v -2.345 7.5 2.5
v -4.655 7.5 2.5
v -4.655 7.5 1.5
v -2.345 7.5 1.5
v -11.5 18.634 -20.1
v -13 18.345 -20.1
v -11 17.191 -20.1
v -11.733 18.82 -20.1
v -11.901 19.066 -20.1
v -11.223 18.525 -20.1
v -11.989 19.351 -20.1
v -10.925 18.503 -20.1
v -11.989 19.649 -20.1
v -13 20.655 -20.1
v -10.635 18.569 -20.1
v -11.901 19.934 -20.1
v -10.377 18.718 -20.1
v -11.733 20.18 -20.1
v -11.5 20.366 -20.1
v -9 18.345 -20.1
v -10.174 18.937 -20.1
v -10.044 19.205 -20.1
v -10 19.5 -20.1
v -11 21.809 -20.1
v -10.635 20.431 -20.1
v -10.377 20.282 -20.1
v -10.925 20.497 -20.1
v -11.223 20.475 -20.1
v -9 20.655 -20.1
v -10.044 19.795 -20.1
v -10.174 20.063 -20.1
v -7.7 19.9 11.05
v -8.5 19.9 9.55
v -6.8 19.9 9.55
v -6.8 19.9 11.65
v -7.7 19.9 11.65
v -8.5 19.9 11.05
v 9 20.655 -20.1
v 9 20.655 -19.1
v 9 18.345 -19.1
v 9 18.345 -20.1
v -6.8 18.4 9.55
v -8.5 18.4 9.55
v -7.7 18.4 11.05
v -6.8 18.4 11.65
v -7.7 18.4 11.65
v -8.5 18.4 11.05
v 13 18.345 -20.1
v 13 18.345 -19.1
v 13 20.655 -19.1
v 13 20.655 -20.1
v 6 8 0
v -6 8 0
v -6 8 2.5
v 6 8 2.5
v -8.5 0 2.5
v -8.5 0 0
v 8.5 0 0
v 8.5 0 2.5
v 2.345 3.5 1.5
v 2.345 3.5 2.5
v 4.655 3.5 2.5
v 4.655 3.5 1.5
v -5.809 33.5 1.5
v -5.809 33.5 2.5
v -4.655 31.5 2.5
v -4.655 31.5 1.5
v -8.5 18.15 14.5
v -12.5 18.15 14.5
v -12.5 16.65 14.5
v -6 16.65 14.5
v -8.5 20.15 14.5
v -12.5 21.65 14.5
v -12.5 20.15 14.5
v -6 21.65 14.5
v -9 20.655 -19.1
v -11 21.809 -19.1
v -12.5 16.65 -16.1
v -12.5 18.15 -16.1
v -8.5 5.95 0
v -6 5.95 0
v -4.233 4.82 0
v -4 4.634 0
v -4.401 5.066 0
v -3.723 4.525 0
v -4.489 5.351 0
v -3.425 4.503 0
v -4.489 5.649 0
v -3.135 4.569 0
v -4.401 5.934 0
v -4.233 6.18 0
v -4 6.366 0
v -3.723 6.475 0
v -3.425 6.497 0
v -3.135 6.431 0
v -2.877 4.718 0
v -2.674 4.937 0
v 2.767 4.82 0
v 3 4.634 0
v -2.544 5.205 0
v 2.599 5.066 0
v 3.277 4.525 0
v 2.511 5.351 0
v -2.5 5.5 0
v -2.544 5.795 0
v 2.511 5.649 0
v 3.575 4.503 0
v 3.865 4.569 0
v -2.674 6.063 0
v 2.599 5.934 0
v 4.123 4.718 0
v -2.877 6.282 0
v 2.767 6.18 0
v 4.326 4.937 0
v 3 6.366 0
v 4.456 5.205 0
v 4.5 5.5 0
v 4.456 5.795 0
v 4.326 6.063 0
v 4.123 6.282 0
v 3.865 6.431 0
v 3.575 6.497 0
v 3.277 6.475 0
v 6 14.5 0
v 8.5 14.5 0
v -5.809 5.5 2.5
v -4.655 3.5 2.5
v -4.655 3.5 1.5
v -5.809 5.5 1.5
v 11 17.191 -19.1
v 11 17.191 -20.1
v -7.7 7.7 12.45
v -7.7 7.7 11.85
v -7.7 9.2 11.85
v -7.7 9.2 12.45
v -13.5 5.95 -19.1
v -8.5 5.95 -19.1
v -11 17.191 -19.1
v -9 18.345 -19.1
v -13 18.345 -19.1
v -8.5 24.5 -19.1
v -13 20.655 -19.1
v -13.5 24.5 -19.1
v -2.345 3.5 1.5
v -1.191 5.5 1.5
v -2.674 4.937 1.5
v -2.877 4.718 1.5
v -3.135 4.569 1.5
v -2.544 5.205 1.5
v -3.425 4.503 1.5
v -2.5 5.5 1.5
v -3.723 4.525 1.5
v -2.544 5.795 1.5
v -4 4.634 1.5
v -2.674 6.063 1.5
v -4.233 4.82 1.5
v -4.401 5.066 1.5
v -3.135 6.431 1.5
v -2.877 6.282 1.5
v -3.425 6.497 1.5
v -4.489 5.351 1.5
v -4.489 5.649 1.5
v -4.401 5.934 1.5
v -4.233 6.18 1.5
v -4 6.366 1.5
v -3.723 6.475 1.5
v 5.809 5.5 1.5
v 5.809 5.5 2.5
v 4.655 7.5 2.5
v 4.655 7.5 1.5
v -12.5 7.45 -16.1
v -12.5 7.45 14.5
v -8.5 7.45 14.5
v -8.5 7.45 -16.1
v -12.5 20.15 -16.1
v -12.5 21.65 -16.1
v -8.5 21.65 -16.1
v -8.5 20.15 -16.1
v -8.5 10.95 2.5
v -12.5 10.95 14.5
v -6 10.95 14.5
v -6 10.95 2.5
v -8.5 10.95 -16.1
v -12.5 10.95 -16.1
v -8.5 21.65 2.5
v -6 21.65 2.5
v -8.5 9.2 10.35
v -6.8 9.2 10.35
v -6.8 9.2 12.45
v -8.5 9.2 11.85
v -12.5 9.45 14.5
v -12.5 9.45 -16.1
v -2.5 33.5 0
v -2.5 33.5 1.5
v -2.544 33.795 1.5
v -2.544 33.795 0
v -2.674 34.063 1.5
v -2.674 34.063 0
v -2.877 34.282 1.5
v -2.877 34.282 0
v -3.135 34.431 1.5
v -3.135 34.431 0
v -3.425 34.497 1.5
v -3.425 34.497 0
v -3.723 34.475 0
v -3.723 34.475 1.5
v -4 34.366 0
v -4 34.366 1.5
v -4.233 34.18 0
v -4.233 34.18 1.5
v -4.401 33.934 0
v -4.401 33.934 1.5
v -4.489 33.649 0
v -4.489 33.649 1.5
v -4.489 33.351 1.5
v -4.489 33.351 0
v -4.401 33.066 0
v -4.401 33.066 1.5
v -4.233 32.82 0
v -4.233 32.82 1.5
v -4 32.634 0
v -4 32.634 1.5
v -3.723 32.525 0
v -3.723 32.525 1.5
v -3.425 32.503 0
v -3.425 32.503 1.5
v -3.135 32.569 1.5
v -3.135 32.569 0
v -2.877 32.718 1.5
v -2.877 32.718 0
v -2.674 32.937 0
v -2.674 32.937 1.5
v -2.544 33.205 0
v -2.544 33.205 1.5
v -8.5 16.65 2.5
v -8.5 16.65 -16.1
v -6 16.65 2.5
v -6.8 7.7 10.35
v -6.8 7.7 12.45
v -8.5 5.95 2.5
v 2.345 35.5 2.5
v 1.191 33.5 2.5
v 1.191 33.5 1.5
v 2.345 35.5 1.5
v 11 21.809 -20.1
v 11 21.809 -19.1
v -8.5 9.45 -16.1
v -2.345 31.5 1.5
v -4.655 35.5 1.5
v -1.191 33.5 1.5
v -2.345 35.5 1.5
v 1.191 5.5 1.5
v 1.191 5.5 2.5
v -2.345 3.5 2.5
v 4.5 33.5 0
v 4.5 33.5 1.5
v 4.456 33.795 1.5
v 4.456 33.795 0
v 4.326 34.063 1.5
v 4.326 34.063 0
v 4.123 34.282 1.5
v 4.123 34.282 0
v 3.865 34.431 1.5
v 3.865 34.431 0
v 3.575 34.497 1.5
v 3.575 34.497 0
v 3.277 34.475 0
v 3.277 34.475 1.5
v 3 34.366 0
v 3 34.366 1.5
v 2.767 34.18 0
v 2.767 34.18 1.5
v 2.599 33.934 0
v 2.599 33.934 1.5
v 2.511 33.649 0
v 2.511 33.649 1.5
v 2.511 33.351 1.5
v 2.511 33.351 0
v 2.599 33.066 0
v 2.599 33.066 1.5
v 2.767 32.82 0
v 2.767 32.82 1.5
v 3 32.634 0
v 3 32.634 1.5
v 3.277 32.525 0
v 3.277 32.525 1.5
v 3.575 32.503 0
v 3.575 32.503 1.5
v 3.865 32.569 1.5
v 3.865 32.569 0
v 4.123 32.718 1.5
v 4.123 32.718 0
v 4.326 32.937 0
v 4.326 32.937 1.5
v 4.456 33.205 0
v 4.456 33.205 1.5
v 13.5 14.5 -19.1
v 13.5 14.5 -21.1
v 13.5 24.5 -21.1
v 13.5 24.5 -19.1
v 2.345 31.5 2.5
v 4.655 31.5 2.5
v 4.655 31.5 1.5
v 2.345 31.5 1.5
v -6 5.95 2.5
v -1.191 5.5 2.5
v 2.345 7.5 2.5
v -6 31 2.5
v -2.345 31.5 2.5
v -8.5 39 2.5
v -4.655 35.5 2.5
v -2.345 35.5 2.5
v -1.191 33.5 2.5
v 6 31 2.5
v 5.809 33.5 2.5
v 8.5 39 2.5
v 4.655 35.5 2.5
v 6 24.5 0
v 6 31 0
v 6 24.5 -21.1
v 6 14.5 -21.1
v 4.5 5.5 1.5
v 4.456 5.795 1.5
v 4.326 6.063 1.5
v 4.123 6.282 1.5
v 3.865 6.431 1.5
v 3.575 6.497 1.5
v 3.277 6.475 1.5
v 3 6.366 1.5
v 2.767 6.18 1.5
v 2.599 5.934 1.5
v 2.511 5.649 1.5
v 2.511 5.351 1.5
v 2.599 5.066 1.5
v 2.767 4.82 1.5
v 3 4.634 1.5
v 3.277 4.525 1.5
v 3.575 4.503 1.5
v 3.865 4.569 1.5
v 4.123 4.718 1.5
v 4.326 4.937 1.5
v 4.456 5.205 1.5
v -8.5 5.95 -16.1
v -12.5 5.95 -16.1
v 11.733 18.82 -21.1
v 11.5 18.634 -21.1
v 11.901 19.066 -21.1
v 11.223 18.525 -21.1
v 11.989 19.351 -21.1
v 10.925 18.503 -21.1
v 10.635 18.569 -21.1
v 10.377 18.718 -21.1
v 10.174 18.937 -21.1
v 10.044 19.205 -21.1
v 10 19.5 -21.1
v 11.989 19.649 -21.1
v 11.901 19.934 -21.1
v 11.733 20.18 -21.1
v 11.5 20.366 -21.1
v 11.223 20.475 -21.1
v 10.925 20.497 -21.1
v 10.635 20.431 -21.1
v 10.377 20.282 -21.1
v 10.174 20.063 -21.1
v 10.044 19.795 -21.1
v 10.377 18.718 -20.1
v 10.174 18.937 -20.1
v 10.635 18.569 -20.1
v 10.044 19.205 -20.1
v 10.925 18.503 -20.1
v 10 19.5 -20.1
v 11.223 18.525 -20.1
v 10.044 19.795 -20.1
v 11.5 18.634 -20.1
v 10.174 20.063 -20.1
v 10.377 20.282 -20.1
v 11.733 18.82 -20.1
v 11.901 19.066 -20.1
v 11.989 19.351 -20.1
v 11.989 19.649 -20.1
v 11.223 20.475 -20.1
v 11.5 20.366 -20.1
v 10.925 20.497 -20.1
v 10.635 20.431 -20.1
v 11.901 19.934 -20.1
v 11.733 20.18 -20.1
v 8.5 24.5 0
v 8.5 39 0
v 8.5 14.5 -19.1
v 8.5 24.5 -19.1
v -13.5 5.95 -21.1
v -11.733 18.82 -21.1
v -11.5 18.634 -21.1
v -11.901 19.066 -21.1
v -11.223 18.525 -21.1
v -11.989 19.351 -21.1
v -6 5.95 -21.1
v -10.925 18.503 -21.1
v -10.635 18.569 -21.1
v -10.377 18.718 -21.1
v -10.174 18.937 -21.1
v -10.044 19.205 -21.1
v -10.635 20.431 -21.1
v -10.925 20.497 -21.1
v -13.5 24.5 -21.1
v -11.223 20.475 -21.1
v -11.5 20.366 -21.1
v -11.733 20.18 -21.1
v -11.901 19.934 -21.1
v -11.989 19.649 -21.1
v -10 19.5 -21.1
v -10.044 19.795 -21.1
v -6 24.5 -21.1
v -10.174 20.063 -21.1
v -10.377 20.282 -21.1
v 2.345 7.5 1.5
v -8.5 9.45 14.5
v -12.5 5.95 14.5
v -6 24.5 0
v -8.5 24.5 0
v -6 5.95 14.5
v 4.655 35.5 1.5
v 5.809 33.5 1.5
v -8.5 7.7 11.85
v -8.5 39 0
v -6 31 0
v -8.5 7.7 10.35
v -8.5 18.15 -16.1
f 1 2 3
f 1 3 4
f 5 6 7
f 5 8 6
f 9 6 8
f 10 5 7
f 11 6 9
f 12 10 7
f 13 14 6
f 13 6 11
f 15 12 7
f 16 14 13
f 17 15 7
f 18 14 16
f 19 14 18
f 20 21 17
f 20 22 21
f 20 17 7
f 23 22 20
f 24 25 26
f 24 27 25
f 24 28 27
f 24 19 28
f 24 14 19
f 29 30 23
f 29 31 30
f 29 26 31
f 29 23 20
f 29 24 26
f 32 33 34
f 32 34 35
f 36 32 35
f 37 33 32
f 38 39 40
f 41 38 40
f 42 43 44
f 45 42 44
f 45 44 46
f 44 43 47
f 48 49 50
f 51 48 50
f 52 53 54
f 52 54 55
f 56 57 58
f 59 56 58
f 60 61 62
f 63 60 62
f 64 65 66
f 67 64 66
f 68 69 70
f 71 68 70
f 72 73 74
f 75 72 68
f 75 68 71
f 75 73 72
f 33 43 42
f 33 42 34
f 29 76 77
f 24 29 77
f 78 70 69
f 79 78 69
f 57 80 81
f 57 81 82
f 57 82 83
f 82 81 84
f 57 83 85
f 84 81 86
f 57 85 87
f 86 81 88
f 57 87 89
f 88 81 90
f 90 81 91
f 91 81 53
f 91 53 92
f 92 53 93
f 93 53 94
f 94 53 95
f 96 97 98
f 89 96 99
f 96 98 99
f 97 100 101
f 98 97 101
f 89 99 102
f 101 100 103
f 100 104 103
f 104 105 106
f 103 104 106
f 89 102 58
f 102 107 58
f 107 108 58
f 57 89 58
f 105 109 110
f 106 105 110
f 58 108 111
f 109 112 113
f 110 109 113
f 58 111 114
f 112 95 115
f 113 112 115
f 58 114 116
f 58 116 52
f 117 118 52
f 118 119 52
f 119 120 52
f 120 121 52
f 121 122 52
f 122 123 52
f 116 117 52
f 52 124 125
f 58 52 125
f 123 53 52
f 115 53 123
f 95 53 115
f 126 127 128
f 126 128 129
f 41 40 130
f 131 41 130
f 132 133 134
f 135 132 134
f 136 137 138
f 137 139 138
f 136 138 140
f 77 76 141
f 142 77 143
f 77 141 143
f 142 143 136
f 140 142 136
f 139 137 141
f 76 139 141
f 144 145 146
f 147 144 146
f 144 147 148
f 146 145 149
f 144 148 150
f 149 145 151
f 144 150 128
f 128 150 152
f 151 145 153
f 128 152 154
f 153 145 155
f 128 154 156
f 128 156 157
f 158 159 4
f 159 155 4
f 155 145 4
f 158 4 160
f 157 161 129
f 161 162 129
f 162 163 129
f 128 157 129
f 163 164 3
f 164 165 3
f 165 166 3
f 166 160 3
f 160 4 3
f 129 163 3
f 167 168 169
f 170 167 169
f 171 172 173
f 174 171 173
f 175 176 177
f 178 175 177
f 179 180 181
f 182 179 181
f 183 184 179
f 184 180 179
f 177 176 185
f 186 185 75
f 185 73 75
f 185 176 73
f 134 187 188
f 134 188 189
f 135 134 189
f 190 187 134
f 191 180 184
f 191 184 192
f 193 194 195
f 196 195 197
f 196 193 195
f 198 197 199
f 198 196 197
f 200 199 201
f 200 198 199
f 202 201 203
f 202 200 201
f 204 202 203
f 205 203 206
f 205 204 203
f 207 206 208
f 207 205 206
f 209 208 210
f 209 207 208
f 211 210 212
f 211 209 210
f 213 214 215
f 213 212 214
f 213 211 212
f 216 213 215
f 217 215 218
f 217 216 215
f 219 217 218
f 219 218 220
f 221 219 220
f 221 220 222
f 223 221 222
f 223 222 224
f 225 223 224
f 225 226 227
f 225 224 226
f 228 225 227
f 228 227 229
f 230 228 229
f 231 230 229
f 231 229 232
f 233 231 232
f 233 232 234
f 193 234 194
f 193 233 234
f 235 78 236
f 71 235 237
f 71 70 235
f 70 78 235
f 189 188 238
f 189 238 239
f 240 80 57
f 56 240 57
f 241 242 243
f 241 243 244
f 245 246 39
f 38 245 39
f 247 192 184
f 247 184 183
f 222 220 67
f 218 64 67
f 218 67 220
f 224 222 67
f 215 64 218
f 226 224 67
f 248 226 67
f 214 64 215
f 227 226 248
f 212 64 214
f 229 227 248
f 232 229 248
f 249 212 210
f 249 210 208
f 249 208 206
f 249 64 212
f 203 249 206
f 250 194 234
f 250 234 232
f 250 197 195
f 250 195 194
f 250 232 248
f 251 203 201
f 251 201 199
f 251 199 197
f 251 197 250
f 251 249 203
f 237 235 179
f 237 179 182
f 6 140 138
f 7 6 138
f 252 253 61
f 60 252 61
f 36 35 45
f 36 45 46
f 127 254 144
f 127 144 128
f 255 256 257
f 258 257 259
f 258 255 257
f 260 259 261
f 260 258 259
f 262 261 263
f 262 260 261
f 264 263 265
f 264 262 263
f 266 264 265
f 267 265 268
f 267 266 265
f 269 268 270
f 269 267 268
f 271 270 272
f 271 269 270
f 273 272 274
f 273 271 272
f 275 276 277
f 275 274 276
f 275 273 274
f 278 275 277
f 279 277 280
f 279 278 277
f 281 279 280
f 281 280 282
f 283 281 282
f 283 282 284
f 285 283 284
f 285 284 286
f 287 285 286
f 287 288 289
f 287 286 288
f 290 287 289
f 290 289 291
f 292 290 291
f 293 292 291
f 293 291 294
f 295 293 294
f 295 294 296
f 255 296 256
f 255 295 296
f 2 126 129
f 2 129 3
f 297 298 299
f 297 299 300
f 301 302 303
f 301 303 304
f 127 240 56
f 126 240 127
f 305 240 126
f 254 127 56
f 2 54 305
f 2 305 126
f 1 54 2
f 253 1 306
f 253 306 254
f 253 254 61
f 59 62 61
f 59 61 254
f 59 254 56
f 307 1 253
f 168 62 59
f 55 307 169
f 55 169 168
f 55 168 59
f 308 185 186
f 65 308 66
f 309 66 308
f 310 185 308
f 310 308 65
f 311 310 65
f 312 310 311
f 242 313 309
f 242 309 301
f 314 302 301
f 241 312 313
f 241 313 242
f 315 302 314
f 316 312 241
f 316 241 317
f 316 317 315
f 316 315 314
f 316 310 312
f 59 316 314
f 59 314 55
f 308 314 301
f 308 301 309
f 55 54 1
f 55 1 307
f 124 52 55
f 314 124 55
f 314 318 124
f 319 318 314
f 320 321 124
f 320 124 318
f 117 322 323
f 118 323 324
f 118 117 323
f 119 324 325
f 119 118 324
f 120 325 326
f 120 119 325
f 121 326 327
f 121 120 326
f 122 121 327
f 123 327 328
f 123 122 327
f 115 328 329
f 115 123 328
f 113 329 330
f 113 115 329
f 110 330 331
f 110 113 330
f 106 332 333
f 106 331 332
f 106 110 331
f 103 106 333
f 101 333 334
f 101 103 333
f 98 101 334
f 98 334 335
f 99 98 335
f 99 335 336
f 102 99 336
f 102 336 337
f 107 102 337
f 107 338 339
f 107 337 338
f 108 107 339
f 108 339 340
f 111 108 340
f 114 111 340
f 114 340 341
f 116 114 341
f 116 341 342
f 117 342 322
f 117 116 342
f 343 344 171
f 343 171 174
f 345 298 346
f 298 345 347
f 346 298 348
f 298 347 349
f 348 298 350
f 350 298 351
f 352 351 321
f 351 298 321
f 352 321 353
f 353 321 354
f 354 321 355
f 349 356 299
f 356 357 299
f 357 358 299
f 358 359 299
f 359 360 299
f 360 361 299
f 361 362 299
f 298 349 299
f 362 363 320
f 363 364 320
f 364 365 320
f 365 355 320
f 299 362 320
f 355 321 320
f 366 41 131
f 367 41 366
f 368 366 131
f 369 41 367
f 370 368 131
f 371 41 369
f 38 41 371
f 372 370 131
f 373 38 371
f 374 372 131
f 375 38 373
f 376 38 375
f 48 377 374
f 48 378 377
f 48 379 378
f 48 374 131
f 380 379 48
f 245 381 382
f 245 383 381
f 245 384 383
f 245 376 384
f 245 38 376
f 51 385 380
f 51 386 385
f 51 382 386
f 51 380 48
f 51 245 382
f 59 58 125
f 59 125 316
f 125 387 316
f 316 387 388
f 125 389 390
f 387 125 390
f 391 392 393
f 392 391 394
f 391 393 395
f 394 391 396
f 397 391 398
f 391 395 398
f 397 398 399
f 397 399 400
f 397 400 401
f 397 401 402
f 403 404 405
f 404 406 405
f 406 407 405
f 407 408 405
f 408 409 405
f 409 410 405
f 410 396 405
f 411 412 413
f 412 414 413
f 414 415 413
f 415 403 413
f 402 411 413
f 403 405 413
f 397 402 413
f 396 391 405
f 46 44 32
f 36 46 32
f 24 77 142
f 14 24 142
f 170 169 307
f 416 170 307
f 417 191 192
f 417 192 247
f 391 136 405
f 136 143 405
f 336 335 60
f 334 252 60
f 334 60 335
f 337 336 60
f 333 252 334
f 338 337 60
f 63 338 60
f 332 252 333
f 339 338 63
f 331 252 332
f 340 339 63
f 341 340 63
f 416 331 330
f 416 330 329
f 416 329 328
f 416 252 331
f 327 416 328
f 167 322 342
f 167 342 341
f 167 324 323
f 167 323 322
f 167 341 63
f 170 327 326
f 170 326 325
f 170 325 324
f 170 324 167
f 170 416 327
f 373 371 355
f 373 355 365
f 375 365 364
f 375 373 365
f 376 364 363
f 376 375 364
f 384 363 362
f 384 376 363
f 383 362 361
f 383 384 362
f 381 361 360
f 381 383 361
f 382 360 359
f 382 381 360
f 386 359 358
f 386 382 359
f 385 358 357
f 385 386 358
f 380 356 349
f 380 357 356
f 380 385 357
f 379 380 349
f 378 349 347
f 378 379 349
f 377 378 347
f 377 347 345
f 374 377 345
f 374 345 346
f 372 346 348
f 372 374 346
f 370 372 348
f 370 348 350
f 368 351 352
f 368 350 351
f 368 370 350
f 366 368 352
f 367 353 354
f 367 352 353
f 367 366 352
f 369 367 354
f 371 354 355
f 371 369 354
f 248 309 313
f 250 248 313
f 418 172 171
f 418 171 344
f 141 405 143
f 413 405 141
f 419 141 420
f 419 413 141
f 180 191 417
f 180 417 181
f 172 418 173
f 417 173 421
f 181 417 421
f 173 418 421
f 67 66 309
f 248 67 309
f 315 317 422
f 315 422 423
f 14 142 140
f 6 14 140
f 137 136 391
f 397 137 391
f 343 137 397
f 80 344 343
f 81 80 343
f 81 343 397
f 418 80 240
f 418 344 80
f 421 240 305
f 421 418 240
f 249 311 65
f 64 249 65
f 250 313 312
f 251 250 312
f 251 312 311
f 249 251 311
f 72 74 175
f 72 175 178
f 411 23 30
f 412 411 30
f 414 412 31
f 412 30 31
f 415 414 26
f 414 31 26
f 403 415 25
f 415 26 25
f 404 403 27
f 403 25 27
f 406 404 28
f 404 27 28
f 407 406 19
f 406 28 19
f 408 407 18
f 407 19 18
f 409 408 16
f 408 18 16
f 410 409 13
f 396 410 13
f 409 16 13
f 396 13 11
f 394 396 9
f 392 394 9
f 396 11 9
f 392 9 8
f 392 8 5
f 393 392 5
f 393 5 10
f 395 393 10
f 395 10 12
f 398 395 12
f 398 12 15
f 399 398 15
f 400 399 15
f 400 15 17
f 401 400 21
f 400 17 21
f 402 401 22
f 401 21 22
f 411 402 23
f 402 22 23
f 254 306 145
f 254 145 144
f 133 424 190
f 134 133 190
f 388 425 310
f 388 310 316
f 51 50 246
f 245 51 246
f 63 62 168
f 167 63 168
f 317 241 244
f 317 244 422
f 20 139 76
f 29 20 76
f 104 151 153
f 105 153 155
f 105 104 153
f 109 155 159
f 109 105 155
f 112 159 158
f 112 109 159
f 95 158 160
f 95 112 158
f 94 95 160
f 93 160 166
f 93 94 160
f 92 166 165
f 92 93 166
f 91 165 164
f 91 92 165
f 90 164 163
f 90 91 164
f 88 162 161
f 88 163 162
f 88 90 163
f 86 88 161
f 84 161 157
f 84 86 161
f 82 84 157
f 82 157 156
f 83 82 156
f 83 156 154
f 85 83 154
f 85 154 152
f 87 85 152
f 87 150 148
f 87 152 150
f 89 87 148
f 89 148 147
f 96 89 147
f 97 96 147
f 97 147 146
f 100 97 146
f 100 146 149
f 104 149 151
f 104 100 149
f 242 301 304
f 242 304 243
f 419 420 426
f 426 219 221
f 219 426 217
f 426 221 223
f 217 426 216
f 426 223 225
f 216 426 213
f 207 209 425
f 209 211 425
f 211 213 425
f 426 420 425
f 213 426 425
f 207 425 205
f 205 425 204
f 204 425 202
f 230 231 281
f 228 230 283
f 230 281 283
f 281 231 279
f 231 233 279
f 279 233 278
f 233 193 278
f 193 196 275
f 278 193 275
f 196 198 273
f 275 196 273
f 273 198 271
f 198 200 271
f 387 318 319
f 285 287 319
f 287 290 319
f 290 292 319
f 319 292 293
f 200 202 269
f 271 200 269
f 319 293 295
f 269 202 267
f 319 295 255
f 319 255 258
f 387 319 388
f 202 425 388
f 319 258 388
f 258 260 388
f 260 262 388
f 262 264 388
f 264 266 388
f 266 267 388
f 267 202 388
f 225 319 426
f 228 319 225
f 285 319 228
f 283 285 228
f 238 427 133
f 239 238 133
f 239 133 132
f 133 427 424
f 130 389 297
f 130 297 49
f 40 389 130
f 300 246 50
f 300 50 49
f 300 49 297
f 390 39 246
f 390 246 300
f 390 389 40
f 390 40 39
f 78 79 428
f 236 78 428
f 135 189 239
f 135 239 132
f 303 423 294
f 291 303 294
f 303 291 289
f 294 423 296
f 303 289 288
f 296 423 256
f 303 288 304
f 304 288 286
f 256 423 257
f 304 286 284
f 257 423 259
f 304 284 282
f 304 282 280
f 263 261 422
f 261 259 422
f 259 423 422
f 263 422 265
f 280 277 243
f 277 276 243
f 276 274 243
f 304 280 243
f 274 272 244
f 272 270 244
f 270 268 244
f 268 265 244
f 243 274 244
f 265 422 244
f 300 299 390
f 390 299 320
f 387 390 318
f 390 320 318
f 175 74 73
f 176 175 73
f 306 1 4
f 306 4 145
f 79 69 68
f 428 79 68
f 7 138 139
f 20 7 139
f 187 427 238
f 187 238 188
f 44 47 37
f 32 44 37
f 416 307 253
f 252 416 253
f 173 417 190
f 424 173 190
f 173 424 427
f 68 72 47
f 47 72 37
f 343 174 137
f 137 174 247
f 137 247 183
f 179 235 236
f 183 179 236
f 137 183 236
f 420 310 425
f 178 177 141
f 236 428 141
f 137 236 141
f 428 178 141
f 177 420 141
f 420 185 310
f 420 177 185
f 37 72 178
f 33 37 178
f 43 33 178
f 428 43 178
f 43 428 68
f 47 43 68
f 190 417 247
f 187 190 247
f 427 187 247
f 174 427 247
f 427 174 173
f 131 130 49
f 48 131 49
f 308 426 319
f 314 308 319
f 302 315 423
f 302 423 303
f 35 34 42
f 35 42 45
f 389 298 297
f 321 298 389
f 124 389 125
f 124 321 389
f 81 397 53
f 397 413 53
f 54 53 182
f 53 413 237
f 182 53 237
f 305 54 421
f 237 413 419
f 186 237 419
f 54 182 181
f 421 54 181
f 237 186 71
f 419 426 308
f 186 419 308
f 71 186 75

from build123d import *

# Parameters (mm, degrees)
SKETCH1_W                     = 17
SKETCH1_H                     = 39
SKETCH1_R                     = 1
SKETCH1_W_2                   = 12
SKETCH1_H_2                   = 23
SERVOBRACKET_DEPTH            = 2.5
SKETCH1_5_W                   = 2.5
SKETCH1_5_H                   = 10
SUPPORTLEGS_DEPTH             = 21.1
SKETCH2_W                     = 2
SKETCH2_H                     = 10
SUPPORTFOOT_DEPTH             = 5
SKETCH3_R                     = 1
BASEBOLTHOLE_DEPTH            = 47.581219392
SERVONUTSLOTS_DEPTH           = 1
BASENUTSLOTS_DEPTH            = 1
SKETCH6_W                     = 2.5
SKETCH6_H                     = 5
TUBEHOLDERBASE_DEPTH          = 12
SKETCH7_W                     = 4
SKETCH7_H                     = 1.5
TUBEHOLDERSTIFFENERRIBS_DEPTH = 30.6
SKETCH8_W                     = 1.5
SKETCH8_H                     = 1.5
SKETCH8_W_2                   = 1
SKETCH8_H_2                   = 1
TUBECLIPENTRANCES_DEPTH       = 1.7
SKETCH9_W                     = 0.9
SKETCH9_H                     = 1.5
TUBECLIPLOCKSLOT_DEPTH        = 0.6
SKETCH10_W                    = 0.9
SKETCH10_H                    = 1.5
TUBECLIPLOCKSLOT2_DEPTH       = 0.6
SUPPORTLEGEXTENSION_DEPTH     = 8.55


with BuildPart() as part:
    # Sketch1 → ServoBracket (new body)
    with BuildSketch(Plane.XY):
        with Locations((0, 19.5)):
            Rectangle(SKETCH1_W, SKETCH1_H)
        with Locations((-3.5, 33.5)):
            Circle(SKETCH1_R, mode=Mode.SUBTRACT)
        with Locations((-3.5, 5.5)):
            Circle(SKETCH1_R, mode=Mode.SUBTRACT)
        with Locations((3.5, 5.5)):
            Circle(SKETCH1_R, mode=Mode.SUBTRACT)
        with Locations((3.5, 33.5)):
            Circle(SKETCH1_R, mode=Mode.SUBTRACT)
        with Locations((0, 19.5)):
            Rectangle(SKETCH1_W_2, SKETCH1_H_2, mode=Mode.SUBTRACT)
    extrude(amount=SERVOBRACKET_DEPTH)

    # Sketch1<5> → SupportLegs (add)
    with BuildSketch(Plane.XY):
        with Locations((-7.25, 19.5)):
            Rectangle(SKETCH1_5_W, SKETCH1_5_H)
        with Locations((7.25, 19.5)):
            Rectangle(SKETCH1_5_W, SKETCH1_5_H)
    extrude(amount=-SUPPORTLEGS_DEPTH)

    # Sketch2 → SupportFoot (add)
    with BuildSketch(Plane.ZY.offset(8.5)):
        with Locations((-20.1, 19.5)):
            Rectangle(SKETCH2_W, SKETCH2_H)
    supportfoot = extrude(amount=SUPPORTFOOT_DEPTH)

    # Sketch3 → BaseBoltHole (cut, symmetric)
    with BuildSketch(Plane.XY.offset(-19.1)):
        with Locations((-11, 19.5)):
            Circle(SKETCH3_R)
    basebolthole = extrude(amount=BASEBOLTHOLE_DEPTH, both=True, mode=Mode.SUBTRACT)

    # SupportFoot2: SupportFoot, BaseBoltHole across plane
    add(supportfoot.mirror(Plane(origin=(0, 0, 0), x_dir=(0, 0, 1), z_dir=(1, 0, 0))))
    add(basebolthole.mirror(Plane(origin=(0, 0, 0), x_dir=(0, 0, 1), z_dir=(1, 0, 0))), mode=Mode.SUBTRACT)

    # Sketch4 → ServoNutSlots (cut)
    with BuildSketch(Plane.XY.offset(2.5)):
        Polygon((-4.654700538, 7.5), (-2.345299462, 7.5), (-1.190598923, 5.5), (-2.345299462, 3.5), (-4.654700538, 3.5), (-5.809401077, 5.5), align=None)
        Polygon((-1.190598923, 33.5), (-2.345299462, 35.5), (-4.654700538, 35.5), (-5.809401077, 33.5), (-4.654700538, 31.5), (-2.345299462, 31.5), align=None)
        Polygon((2.345299462, 31.5), (1.190598923, 33.5), (2.345299462, 35.5), (4.654700538, 35.5), (5.809401077, 33.5), (4.654700538, 31.5), align=None)
        Polygon((4.654700538, 7.5), (2.345299462, 7.5), (1.190598923, 5.5), (2.345299462, 3.5), (4.654700538, 3.5), (5.809401077, 5.5), align=None)
    extrude(amount=-SERVONUTSLOTS_DEPTH, mode=Mode.SUBTRACT)

    # Sketch5 → BaseNutSlots (cut)
    with BuildSketch(Plane.XY.offset(-19.1)):
        Polygon((-11, 21.809401077), (-13, 20.654700538), (-13, 18.345299462), (-11, 17.190598923), (-9, 18.345299462), (-9, 20.654700538), align=None)
        Polygon((11, 21.809401077), (9, 20.654700538), (9, 18.345299462), (11, 17.190598923), (13, 18.345299462), (13, 20.654700538), align=None)
    extrude(amount=-BASENUTSLOTS_DEPTH, mode=Mode.SUBTRACT)

    # Sketch6 → TubeHolderBase (add)
    with BuildSketch(Plane.XY.offset(2.5)):
        with Locations((-7.25, 19.15)):
            Rectangle(SKETCH6_W, SKETCH6_H)
    tubeholderbase = extrude(amount=TUBEHOLDERBASE_DEPTH)

    # Sketch7 → TubeHolderStiffenerRibs (add)
    with BuildSketch(Plane.XY.offset(14.5)):
        with Locations((-10.5, 20.9)):
            Rectangle(SKETCH7_W, SKETCH7_H)
        with Locations((-10.5, 17.4)):
            Rectangle(SKETCH7_W, SKETCH7_H)
    tubeholderstiffenerribs = extrude(amount=-TUBEHOLDERSTIFFENERRIBS_DEPTH)

    # TubeHolder2: TubeHolderBase, TubeHolderStiffenerRibs across plane
    add(tubeholderbase.mirror(Plane.ZX.offset(13.8)))
    add(tubeholderstiffenerribs.mirror(Plane.ZX.offset(13.8)))

    # Sketch8 → TubeClipEntrances (cut)
    # profile 1 of 4: a face of its own
    with BuildSketch(Plane.ZY.offset(8.5)):
        with Locations((10.3, 19.15)):
            Rectangle(SKETCH8_W, SKETCH8_H)
        with Locations((10.3, 19.15)):
            Rectangle(SKETCH8_W_2, SKETCH8_H_2, mode=Mode.SUBTRACT)
    # profile 2 of 4: a face of its own
    with BuildSketch(Plane.ZY.offset(8.5)):
        with Locations((10.3, 19.15)):
            Rectangle(SKETCH8_W_2, SKETCH8_H_2)
    # profile 3 of 4: a face of its own
    with BuildSketch(Plane.ZY.offset(8.5)):
        with Locations((11.1, 8.45)):
            Rectangle(SKETCH8_W, SKETCH8_H)
        with Locations((11.1, 8.45)):
            Rectangle(SKETCH8_W_2, SKETCH8_H_2, mode=Mode.SUBTRACT)
    # profile 4 of 4: a face of its own
    with BuildSketch(Plane.ZY.offset(8.5)):
        with Locations((11.1, 8.45)):
            Rectangle(SKETCH8_W_2, SKETCH8_H_2)
    extrude(amount=-TUBECLIPENTRANCES_DEPTH, mode=Mode.SUBTRACT)

    # Sketch9 → TubeClipLockSlot (cut)
    with BuildSketch(Plane(origin=(0, 0, 11.05), x_dir=(-1, 0, 0), z_dir=(0, 0, -1))):
        with Locations((7.25, 19.15)):
            Rectangle(SKETCH9_W, SKETCH9_H)
    extrude(amount=-TUBECLIPLOCKSLOT_DEPTH, mode=Mode.SUBTRACT)

    # Sketch10 → TubeClipLockSlot2 (cut)
    with BuildSketch(Plane(origin=(0, 0, 11.85), x_dir=(-1, 0, 0), z_dir=(0, 0, -1))):
        with Locations((7.25, 8.45)):
            Rectangle(SKETCH10_W, SKETCH10_H)
    extrude(amount=-TUBECLIPLOCKSLOT2_DEPTH, mode=Mode.SUBTRACT)

    # Sketch11 → SupportLegExtension (add)
    with BuildSketch(Plane.XZ.offset(-14.5)):
        Polygon((-6, 0), (-8.5, 0), (-8.5, -19.1), (-13.5, -19.1), (-13.5, -21.1), (-6, -21.1), align=None)
    extrude(amount=SUPPORTLEGEXTENSION_DEPTH)


solid = part.part
